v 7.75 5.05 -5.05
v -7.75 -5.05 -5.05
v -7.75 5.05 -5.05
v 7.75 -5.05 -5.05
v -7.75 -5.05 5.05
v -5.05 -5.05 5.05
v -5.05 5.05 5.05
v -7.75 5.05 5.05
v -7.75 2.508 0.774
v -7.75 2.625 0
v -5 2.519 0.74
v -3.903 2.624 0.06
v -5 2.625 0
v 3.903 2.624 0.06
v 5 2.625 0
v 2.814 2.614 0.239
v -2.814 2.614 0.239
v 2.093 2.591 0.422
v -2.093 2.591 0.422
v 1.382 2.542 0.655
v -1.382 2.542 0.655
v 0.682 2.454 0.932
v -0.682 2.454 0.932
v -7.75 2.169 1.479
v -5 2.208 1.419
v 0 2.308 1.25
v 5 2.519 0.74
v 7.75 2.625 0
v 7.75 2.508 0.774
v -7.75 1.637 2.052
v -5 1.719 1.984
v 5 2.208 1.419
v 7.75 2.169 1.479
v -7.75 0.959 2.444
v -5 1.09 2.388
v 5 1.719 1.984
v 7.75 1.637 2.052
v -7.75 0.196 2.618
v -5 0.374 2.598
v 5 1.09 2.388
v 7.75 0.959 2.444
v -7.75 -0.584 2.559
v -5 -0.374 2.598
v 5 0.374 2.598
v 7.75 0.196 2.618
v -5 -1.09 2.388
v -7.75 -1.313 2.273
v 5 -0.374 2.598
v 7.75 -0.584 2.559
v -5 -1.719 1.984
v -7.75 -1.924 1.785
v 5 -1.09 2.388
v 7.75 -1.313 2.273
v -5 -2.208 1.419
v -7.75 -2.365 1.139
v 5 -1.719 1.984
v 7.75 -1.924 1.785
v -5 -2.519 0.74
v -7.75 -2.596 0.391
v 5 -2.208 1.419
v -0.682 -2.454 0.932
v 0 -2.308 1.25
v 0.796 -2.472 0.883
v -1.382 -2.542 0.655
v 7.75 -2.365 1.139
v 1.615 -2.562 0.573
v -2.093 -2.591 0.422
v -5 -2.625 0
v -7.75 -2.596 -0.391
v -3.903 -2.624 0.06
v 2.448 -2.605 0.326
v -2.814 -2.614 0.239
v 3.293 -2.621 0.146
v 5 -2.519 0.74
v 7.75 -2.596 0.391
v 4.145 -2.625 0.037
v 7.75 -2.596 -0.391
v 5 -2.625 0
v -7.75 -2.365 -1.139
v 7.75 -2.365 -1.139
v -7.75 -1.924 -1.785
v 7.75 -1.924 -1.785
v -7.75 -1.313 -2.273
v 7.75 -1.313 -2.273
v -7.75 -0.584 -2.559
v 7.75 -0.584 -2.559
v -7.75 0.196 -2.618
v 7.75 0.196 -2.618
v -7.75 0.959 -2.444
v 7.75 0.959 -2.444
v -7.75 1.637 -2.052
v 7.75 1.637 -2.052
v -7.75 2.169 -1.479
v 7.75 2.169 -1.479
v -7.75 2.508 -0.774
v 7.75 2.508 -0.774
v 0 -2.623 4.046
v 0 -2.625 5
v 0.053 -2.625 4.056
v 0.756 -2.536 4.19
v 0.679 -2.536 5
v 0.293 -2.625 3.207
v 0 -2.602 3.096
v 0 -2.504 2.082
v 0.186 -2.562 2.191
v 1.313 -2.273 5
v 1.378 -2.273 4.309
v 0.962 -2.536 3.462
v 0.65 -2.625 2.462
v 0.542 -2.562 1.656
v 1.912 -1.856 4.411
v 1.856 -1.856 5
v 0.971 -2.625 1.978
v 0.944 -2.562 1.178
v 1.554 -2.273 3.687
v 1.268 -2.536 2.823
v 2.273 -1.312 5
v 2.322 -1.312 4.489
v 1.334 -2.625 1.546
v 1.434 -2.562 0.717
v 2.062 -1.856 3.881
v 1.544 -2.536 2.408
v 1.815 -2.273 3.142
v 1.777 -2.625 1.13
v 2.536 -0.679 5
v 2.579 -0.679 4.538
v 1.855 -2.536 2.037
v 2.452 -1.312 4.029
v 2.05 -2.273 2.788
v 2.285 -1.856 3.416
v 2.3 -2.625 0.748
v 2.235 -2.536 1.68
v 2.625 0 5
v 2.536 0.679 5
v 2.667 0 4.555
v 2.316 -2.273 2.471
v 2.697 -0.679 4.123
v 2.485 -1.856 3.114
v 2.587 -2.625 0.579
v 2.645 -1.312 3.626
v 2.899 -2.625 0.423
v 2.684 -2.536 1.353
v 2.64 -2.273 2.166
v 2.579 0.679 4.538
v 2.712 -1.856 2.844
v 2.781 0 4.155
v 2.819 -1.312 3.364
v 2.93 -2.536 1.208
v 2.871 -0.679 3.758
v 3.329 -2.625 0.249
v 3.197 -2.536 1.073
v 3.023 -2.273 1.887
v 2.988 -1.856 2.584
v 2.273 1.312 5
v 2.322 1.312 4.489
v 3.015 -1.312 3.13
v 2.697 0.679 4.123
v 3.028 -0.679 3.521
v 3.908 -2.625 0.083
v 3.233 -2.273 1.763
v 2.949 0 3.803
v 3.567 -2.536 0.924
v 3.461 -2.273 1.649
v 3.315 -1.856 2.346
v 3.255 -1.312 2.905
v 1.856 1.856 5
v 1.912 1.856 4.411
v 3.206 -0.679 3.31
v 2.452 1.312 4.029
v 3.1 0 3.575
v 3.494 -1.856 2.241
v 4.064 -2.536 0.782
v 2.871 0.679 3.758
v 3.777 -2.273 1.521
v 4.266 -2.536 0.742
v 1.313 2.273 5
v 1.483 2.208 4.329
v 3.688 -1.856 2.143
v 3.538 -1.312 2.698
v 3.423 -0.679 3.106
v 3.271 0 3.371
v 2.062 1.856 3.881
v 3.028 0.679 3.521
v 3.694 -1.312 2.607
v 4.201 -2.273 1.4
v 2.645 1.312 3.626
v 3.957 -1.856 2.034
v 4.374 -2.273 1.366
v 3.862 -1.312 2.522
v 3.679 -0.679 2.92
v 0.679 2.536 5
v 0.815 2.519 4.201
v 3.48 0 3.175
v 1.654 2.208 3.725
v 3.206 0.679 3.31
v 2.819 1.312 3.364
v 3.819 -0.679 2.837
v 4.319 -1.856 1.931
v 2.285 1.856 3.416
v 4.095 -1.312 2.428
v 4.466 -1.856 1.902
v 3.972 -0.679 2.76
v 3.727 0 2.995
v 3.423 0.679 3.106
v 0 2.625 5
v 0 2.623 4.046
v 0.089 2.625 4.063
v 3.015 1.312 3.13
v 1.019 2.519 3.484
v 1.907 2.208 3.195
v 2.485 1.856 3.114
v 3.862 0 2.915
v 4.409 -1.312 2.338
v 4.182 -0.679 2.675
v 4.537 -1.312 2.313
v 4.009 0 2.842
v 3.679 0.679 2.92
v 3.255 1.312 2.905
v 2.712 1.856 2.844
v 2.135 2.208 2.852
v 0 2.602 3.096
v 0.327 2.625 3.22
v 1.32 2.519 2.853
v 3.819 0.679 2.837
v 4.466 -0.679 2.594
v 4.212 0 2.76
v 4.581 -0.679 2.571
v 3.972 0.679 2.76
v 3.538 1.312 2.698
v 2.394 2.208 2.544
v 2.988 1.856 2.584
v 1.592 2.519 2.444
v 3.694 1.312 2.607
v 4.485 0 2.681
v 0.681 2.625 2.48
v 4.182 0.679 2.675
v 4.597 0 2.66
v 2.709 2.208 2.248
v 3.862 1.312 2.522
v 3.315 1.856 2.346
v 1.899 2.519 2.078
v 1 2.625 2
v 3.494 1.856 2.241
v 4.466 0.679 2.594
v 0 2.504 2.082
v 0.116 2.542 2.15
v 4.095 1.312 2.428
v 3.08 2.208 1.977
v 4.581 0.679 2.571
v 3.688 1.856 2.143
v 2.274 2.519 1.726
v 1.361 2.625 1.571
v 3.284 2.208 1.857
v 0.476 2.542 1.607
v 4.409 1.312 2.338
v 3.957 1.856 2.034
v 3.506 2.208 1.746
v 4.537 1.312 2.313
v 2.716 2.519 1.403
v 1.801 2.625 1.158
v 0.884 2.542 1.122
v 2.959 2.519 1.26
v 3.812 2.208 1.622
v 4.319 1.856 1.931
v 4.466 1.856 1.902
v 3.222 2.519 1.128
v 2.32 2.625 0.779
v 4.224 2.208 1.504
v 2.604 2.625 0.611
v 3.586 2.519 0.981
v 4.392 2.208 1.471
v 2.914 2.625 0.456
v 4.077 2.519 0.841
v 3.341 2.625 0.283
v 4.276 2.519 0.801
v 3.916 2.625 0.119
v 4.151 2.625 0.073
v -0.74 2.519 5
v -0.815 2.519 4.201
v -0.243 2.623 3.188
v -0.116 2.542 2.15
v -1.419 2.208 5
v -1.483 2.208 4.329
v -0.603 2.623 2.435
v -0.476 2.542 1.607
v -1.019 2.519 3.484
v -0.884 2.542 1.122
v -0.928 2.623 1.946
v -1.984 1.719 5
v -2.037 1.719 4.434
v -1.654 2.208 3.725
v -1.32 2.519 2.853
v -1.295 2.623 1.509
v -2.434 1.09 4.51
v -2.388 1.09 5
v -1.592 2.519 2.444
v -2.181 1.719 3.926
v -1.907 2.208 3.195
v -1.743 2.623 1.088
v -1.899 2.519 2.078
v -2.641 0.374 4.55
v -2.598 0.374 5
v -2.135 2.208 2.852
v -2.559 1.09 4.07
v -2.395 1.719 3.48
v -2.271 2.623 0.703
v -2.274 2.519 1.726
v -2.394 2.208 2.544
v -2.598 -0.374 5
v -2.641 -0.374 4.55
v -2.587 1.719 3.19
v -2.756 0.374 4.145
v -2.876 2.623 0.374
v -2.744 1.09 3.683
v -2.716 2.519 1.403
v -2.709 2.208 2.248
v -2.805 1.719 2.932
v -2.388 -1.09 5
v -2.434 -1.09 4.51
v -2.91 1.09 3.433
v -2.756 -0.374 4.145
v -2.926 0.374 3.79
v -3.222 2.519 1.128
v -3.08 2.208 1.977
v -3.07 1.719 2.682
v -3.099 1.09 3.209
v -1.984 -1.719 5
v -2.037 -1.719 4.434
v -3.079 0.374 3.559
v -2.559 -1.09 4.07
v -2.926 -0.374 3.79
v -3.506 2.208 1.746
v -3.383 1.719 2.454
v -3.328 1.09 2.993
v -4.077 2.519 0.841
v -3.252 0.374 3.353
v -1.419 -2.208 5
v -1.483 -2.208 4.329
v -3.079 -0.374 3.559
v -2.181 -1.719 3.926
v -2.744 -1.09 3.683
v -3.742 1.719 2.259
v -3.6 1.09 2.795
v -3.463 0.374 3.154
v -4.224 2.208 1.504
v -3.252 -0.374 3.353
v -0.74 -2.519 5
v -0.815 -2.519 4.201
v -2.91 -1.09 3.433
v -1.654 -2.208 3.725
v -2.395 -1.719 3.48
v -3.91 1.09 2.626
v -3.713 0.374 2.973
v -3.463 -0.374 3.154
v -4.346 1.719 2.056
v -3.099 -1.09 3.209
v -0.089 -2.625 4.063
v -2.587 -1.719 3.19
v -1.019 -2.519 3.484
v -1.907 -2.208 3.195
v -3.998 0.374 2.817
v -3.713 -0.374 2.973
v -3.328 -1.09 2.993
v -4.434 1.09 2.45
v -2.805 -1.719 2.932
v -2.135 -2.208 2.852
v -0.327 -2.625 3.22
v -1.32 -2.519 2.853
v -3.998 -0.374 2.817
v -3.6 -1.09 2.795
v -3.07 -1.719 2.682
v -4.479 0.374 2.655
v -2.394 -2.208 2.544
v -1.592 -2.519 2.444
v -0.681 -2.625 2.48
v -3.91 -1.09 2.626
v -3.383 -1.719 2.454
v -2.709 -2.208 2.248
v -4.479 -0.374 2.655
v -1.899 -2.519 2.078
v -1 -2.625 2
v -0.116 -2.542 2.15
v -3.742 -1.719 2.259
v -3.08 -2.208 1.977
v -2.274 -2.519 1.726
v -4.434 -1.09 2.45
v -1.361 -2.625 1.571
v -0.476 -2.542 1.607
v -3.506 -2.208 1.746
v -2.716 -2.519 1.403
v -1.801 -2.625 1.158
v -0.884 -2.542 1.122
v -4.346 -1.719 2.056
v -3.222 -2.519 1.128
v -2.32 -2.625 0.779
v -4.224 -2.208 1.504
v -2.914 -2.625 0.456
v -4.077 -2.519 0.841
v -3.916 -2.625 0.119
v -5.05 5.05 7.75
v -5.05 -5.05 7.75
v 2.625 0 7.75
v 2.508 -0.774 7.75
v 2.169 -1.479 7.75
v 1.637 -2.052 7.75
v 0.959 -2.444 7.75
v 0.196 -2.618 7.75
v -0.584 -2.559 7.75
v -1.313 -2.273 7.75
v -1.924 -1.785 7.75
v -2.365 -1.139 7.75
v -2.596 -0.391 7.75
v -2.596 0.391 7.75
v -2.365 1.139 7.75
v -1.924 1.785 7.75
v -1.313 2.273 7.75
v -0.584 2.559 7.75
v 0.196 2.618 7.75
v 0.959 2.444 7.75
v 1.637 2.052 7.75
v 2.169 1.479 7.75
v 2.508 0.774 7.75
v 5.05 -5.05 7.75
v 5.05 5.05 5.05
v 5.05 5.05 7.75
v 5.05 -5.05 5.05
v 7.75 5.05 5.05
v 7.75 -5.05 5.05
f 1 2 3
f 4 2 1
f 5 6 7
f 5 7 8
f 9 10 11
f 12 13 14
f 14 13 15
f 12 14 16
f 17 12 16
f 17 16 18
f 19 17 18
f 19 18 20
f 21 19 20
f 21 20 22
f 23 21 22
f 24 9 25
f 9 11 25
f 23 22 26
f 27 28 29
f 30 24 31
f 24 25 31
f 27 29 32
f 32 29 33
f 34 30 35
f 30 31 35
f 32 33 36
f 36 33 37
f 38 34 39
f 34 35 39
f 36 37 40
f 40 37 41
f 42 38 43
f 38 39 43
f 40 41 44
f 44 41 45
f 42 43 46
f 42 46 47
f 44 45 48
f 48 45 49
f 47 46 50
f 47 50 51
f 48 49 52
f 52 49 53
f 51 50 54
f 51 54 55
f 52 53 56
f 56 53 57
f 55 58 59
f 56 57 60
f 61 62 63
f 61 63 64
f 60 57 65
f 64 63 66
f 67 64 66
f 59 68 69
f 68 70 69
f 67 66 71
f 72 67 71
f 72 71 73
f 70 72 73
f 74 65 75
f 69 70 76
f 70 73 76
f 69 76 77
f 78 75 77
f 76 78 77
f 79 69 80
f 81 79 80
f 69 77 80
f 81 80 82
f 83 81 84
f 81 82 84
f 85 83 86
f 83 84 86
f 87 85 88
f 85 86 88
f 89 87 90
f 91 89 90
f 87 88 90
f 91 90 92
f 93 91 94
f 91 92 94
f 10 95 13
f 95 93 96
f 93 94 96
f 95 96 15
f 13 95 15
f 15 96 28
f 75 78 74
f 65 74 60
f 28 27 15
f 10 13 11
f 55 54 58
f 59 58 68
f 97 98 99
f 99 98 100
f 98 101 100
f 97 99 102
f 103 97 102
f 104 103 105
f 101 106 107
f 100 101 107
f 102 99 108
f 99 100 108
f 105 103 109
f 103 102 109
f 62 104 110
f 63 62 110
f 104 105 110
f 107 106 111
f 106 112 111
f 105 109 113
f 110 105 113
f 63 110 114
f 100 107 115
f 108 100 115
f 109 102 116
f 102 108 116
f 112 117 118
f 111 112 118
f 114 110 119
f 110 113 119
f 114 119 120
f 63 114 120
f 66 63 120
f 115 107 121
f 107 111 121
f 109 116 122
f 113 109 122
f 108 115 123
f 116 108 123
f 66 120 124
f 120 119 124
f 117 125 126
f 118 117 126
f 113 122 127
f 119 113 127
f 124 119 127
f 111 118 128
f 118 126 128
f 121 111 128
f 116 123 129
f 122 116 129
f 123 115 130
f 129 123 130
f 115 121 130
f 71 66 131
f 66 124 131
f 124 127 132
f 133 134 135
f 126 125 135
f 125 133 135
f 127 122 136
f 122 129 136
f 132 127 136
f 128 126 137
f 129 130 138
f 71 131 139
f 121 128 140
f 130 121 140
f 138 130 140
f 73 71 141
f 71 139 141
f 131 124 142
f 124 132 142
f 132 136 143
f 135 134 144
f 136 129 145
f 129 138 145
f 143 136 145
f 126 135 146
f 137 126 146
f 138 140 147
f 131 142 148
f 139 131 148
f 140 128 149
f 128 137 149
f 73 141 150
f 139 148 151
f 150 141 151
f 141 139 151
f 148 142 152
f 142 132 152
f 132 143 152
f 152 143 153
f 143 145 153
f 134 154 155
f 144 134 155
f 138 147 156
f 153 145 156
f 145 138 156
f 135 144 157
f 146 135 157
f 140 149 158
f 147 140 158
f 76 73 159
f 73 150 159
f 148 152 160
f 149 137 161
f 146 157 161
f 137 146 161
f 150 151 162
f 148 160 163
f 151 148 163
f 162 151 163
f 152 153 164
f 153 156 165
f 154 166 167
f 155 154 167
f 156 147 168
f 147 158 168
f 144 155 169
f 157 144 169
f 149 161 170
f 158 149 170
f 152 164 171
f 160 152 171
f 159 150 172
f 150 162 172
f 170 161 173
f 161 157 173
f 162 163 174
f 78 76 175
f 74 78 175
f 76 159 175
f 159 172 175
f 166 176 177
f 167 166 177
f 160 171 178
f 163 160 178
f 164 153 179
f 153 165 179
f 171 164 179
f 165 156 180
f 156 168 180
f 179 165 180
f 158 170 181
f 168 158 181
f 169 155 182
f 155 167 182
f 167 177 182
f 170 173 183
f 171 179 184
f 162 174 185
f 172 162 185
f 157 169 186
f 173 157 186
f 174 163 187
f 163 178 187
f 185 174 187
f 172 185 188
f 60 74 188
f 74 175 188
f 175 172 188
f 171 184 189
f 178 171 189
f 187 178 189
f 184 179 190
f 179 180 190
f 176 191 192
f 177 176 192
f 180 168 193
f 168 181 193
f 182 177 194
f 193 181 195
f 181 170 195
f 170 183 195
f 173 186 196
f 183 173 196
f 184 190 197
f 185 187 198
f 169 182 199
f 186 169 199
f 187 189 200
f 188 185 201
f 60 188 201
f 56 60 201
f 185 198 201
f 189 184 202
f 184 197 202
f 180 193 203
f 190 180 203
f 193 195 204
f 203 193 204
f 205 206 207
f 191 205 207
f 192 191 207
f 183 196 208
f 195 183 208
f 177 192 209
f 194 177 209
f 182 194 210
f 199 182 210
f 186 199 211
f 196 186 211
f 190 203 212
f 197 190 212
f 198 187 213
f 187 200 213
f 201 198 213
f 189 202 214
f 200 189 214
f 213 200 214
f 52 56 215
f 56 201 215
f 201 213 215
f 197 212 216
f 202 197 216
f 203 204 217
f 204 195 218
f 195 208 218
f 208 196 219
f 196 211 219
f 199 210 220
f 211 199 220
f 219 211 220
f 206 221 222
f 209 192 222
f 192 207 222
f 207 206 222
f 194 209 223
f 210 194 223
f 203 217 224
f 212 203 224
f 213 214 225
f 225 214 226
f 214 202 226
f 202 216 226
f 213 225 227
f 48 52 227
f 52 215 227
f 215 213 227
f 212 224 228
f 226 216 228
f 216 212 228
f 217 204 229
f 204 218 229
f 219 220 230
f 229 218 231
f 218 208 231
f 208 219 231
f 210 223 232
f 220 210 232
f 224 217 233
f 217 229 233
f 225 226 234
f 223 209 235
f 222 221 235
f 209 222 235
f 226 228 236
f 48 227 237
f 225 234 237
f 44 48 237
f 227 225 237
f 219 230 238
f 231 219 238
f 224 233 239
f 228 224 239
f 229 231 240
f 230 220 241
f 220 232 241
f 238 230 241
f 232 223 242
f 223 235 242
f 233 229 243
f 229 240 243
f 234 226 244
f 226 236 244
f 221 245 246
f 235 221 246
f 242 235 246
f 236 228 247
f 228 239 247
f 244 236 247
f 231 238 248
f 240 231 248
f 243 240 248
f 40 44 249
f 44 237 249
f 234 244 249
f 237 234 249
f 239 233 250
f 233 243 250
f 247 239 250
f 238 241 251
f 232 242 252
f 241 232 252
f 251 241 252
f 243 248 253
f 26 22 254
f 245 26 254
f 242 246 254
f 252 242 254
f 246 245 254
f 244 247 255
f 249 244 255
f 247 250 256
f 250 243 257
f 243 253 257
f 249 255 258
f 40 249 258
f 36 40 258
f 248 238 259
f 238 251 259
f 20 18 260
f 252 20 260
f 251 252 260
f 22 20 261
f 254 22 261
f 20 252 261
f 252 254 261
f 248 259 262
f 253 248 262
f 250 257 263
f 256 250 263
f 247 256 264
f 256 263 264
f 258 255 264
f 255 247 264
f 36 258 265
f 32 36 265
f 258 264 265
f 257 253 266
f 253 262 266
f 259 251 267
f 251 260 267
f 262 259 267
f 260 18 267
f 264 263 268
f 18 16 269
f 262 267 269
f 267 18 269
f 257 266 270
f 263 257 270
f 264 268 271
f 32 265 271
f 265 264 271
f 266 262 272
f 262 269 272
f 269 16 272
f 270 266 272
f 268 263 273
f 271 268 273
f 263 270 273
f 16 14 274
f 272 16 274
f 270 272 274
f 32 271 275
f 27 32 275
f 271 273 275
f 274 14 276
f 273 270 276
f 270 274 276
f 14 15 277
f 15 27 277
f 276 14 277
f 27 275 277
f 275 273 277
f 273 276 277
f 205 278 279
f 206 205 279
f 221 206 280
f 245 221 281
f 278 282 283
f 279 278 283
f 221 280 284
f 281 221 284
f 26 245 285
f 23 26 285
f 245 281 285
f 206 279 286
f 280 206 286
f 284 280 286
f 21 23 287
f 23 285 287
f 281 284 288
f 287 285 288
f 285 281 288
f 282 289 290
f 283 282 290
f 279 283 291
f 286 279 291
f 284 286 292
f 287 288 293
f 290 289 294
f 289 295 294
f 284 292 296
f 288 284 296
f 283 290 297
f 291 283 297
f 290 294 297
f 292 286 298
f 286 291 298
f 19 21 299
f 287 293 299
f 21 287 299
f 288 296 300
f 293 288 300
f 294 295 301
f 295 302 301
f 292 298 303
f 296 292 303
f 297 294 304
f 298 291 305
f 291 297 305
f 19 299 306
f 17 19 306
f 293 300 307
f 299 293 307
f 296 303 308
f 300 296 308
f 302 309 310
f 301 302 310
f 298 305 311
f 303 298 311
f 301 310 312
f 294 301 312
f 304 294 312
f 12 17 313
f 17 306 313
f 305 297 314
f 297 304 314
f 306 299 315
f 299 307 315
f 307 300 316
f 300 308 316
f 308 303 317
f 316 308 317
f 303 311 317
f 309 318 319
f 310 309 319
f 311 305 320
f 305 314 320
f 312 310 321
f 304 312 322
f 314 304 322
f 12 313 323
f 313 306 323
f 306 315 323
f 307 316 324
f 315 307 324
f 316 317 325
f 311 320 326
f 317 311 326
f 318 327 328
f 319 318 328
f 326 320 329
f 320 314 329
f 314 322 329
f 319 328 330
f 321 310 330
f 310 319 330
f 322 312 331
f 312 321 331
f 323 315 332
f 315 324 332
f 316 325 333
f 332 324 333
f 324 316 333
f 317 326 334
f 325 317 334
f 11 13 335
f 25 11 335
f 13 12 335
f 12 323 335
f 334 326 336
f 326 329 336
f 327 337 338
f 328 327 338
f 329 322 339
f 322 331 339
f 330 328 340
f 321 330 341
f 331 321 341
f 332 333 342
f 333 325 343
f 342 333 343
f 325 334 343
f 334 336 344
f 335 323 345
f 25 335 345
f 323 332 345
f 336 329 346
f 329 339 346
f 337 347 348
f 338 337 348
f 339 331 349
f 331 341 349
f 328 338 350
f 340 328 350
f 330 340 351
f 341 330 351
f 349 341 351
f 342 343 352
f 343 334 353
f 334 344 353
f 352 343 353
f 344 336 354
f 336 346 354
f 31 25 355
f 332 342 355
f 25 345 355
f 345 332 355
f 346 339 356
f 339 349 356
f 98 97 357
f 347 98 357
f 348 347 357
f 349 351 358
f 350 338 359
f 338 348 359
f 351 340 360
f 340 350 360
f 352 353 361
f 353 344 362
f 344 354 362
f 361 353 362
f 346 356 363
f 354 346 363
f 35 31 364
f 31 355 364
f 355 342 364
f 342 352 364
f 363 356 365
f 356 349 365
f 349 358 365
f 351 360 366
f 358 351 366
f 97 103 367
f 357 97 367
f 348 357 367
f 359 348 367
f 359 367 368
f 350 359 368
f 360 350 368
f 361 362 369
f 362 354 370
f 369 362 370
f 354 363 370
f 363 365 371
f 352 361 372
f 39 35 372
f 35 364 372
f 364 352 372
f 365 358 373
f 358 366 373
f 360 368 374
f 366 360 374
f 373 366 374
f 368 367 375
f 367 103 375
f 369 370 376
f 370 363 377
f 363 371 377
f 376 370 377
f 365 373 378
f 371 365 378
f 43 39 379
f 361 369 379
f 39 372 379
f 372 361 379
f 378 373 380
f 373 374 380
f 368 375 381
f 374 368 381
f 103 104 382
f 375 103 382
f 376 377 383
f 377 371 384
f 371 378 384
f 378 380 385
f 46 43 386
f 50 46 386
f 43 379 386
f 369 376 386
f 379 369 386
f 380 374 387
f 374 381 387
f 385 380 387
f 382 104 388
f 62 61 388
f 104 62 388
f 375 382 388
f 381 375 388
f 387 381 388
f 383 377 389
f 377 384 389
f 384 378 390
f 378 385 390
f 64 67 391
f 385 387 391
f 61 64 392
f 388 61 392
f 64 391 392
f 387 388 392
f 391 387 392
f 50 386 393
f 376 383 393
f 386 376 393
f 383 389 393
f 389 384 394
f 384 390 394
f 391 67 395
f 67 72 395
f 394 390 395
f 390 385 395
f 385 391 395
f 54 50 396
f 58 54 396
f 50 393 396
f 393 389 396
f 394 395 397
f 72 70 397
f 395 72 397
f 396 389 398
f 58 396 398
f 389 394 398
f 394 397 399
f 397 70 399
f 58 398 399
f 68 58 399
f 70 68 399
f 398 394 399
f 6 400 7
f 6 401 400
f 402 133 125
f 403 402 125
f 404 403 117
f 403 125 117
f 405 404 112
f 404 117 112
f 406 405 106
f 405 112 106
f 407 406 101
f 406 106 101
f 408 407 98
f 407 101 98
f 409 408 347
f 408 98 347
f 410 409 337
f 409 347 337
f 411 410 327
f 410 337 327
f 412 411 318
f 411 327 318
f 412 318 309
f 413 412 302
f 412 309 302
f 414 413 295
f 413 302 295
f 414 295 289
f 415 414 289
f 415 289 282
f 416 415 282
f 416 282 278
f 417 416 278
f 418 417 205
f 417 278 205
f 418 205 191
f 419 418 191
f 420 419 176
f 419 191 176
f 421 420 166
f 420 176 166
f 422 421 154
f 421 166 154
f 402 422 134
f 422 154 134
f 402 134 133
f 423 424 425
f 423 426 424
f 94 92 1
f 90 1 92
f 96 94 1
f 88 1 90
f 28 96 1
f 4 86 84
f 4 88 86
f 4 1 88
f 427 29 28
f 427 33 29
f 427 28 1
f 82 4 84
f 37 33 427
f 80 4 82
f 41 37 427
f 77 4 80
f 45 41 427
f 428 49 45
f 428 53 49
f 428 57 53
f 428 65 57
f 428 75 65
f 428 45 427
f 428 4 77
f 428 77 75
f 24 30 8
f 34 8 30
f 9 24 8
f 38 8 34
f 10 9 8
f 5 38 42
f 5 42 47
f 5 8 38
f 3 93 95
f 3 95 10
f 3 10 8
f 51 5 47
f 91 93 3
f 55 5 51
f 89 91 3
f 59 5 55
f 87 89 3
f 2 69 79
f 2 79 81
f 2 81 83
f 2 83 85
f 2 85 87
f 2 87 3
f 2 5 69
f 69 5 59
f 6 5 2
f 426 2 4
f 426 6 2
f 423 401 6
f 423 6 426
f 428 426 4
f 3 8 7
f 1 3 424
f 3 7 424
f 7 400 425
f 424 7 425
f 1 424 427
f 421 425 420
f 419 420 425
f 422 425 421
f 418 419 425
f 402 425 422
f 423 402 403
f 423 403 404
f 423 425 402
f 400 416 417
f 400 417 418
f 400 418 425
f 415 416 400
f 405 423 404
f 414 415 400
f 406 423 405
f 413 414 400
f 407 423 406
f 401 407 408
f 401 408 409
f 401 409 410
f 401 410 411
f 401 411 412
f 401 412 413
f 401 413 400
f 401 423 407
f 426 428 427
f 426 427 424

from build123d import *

# Parameters (mm, degrees)
F1_DEPTH = 5.05
F2_R     = 2.625
F5_R     = 2.625


with BuildPart() as f1:
    # F0 (on Front) → F1 (new body, symmetric)
    with BuildSketch(Plane.XZ):
        Polygon((0, 7.75), (-5.05, 7.75), (-5.05, 5.05), (-7.75, 5.05), (-7.75, 0), (-7.75, -5.05), (7.75, -5.05), (7.75, 0), (7.75, 5.05), (5.05, 5.05), (5.05, 7.75), align=None)
    extrude(amount=F1_DEPTH, both=True)

    # F4: sweep along a path in F3
    with BuildLine(Plane.XZ) as f4_path:
        Line((-10.5985039845, 0), (11.5115959197, 0))
    # F2 (on Right) → F4 (sweep, cut)
    with BuildSketch(Plane.YZ):
        Circle(F2_R)
    sweep(path=f4_path.line, mode=Mode.SUBTRACT)

    # F7: sweep along a path in F6
    with BuildLine(Plane.XZ) as f7_path:
        Line((0, 10.9545877203), (0, 5))
        ThreePointArc((0, 5), (1.4644660941, 1.4644660941), (5, 0))
    # F5 (on face) → F7 (sweep, cut)
    with BuildSketch(Plane.XY.offset(7.75)):
        Circle(F5_R)
    sweep(path=f7_path.line, mode=Mode.SUBTRACT)

    # F8: sweep along a path in F6
    with BuildLine(Plane.XZ) as f8_path:
        Line((0, 10.9545877203), (0, 5))
        ThreePointArc((0, 5), (-1.4644660941, 1.4644660941), (-5, 0))
    # F5 (on face) → F8 (sweep, cut)
    with BuildSketch(Plane.XY.offset(7.75)):
        Circle(F5_R)
    sweep(path=f8_path.line, mode=Mode.SUBTRACT)


solid = f1.part
